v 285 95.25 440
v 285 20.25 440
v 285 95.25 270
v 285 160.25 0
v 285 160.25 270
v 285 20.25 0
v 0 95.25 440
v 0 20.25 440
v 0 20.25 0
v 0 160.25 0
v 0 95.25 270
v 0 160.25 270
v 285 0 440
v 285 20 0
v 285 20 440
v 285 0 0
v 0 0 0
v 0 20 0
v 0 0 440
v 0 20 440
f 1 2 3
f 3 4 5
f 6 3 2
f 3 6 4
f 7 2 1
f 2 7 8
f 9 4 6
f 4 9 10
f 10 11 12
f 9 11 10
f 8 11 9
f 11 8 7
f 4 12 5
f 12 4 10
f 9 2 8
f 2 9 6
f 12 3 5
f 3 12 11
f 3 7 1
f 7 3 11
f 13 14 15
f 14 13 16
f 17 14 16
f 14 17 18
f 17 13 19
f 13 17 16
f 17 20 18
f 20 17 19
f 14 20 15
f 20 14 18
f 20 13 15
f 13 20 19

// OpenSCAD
// file: time_utility.scad
// Utility functions to help manage time steps $t
// 2017/04/28 - Roger Cheng

// Returns 0-1 for the portion of time between start/end.
function timeRanged(start, current, end) = 
    current<=start? 0 : 
        (current>=end ? 1 : 
            ((current-start)/(end-start)));

// Symmetric animation 0 to 1 to 0 while $t goes 0 to 1
function timeSymmetric() = abs($t-0.5)*2;

// A little padding on either end of timeSymmetric()
padStart=0.1;
padEnd=0.9;
function timePadded() = timeRanged(padStart, timeSymmetric(), padEnd);
// main file
// Learning exercise to put the Luggable PC hinge visualization into OpenSCAD
// 2017/04/28 - Roger Cheng
use <time_utility.scad>

// Gap in between pieces for 3D printer tolerance. Also useful for CSG difference()
gap = 0.25;

// Main chassis dimensions

// The width, depth, and height of the bounding box
chassisW = 285;
chassisD = 140;
chassisH = 440;

// The depth and height of the cutout
cutoutD = 65;
cutoutH = 170;

// Screen dimensions, as measured when open (so 90 degrees off from chassis)
screenW = chassisH;
screenH = chassisW;
screenD = 20;


// Chassis bounding box - cutout box
module chassis()
{
    difference() {
        cube([chassisW, chassisD, chassisH]);
        translate([-gap/2, chassisD-cutoutD, chassisH-cutoutH]) 
            cube([chassisW+gap, chassisD-cutoutD+gap, cutoutH+gap]);
    }
}

// Screen bounding box
module screen()
{
    cube([screenW, screenD, screenH]);
}

// Put an instance of chassis in the space, translated a bit to make room for screen.
color([0, 0, 1])
{
    translate([0, screenD+gap, 0])
    {
        chassis();
    }
}

// Add an instance of screen into the space, including animation for hinge operation
color([0, 1, 0])
{
    centerD = screenD/2;

    // Translate the screen to its position relative to chassis.
    translate([chassisW-screenW, 0, chassisH-screenH])
    
    // Translate the screen back to the originally-constructed location.
    translate([screenW-centerD, centerD, screenH-centerD])
    // The two axis of hinge movement
    rotate([0, 90*timeRanged(0, timePadded(), 0.9), 0])
    rotate([0, 0, 180*timeRanged(0.1, timePadded(), 1)])
    {
        // Translate screen to align center of rotation with origin.
        translate([centerD-screenW, -centerD, centerD-screenH])
        {
            screen();
        }
    }
}
